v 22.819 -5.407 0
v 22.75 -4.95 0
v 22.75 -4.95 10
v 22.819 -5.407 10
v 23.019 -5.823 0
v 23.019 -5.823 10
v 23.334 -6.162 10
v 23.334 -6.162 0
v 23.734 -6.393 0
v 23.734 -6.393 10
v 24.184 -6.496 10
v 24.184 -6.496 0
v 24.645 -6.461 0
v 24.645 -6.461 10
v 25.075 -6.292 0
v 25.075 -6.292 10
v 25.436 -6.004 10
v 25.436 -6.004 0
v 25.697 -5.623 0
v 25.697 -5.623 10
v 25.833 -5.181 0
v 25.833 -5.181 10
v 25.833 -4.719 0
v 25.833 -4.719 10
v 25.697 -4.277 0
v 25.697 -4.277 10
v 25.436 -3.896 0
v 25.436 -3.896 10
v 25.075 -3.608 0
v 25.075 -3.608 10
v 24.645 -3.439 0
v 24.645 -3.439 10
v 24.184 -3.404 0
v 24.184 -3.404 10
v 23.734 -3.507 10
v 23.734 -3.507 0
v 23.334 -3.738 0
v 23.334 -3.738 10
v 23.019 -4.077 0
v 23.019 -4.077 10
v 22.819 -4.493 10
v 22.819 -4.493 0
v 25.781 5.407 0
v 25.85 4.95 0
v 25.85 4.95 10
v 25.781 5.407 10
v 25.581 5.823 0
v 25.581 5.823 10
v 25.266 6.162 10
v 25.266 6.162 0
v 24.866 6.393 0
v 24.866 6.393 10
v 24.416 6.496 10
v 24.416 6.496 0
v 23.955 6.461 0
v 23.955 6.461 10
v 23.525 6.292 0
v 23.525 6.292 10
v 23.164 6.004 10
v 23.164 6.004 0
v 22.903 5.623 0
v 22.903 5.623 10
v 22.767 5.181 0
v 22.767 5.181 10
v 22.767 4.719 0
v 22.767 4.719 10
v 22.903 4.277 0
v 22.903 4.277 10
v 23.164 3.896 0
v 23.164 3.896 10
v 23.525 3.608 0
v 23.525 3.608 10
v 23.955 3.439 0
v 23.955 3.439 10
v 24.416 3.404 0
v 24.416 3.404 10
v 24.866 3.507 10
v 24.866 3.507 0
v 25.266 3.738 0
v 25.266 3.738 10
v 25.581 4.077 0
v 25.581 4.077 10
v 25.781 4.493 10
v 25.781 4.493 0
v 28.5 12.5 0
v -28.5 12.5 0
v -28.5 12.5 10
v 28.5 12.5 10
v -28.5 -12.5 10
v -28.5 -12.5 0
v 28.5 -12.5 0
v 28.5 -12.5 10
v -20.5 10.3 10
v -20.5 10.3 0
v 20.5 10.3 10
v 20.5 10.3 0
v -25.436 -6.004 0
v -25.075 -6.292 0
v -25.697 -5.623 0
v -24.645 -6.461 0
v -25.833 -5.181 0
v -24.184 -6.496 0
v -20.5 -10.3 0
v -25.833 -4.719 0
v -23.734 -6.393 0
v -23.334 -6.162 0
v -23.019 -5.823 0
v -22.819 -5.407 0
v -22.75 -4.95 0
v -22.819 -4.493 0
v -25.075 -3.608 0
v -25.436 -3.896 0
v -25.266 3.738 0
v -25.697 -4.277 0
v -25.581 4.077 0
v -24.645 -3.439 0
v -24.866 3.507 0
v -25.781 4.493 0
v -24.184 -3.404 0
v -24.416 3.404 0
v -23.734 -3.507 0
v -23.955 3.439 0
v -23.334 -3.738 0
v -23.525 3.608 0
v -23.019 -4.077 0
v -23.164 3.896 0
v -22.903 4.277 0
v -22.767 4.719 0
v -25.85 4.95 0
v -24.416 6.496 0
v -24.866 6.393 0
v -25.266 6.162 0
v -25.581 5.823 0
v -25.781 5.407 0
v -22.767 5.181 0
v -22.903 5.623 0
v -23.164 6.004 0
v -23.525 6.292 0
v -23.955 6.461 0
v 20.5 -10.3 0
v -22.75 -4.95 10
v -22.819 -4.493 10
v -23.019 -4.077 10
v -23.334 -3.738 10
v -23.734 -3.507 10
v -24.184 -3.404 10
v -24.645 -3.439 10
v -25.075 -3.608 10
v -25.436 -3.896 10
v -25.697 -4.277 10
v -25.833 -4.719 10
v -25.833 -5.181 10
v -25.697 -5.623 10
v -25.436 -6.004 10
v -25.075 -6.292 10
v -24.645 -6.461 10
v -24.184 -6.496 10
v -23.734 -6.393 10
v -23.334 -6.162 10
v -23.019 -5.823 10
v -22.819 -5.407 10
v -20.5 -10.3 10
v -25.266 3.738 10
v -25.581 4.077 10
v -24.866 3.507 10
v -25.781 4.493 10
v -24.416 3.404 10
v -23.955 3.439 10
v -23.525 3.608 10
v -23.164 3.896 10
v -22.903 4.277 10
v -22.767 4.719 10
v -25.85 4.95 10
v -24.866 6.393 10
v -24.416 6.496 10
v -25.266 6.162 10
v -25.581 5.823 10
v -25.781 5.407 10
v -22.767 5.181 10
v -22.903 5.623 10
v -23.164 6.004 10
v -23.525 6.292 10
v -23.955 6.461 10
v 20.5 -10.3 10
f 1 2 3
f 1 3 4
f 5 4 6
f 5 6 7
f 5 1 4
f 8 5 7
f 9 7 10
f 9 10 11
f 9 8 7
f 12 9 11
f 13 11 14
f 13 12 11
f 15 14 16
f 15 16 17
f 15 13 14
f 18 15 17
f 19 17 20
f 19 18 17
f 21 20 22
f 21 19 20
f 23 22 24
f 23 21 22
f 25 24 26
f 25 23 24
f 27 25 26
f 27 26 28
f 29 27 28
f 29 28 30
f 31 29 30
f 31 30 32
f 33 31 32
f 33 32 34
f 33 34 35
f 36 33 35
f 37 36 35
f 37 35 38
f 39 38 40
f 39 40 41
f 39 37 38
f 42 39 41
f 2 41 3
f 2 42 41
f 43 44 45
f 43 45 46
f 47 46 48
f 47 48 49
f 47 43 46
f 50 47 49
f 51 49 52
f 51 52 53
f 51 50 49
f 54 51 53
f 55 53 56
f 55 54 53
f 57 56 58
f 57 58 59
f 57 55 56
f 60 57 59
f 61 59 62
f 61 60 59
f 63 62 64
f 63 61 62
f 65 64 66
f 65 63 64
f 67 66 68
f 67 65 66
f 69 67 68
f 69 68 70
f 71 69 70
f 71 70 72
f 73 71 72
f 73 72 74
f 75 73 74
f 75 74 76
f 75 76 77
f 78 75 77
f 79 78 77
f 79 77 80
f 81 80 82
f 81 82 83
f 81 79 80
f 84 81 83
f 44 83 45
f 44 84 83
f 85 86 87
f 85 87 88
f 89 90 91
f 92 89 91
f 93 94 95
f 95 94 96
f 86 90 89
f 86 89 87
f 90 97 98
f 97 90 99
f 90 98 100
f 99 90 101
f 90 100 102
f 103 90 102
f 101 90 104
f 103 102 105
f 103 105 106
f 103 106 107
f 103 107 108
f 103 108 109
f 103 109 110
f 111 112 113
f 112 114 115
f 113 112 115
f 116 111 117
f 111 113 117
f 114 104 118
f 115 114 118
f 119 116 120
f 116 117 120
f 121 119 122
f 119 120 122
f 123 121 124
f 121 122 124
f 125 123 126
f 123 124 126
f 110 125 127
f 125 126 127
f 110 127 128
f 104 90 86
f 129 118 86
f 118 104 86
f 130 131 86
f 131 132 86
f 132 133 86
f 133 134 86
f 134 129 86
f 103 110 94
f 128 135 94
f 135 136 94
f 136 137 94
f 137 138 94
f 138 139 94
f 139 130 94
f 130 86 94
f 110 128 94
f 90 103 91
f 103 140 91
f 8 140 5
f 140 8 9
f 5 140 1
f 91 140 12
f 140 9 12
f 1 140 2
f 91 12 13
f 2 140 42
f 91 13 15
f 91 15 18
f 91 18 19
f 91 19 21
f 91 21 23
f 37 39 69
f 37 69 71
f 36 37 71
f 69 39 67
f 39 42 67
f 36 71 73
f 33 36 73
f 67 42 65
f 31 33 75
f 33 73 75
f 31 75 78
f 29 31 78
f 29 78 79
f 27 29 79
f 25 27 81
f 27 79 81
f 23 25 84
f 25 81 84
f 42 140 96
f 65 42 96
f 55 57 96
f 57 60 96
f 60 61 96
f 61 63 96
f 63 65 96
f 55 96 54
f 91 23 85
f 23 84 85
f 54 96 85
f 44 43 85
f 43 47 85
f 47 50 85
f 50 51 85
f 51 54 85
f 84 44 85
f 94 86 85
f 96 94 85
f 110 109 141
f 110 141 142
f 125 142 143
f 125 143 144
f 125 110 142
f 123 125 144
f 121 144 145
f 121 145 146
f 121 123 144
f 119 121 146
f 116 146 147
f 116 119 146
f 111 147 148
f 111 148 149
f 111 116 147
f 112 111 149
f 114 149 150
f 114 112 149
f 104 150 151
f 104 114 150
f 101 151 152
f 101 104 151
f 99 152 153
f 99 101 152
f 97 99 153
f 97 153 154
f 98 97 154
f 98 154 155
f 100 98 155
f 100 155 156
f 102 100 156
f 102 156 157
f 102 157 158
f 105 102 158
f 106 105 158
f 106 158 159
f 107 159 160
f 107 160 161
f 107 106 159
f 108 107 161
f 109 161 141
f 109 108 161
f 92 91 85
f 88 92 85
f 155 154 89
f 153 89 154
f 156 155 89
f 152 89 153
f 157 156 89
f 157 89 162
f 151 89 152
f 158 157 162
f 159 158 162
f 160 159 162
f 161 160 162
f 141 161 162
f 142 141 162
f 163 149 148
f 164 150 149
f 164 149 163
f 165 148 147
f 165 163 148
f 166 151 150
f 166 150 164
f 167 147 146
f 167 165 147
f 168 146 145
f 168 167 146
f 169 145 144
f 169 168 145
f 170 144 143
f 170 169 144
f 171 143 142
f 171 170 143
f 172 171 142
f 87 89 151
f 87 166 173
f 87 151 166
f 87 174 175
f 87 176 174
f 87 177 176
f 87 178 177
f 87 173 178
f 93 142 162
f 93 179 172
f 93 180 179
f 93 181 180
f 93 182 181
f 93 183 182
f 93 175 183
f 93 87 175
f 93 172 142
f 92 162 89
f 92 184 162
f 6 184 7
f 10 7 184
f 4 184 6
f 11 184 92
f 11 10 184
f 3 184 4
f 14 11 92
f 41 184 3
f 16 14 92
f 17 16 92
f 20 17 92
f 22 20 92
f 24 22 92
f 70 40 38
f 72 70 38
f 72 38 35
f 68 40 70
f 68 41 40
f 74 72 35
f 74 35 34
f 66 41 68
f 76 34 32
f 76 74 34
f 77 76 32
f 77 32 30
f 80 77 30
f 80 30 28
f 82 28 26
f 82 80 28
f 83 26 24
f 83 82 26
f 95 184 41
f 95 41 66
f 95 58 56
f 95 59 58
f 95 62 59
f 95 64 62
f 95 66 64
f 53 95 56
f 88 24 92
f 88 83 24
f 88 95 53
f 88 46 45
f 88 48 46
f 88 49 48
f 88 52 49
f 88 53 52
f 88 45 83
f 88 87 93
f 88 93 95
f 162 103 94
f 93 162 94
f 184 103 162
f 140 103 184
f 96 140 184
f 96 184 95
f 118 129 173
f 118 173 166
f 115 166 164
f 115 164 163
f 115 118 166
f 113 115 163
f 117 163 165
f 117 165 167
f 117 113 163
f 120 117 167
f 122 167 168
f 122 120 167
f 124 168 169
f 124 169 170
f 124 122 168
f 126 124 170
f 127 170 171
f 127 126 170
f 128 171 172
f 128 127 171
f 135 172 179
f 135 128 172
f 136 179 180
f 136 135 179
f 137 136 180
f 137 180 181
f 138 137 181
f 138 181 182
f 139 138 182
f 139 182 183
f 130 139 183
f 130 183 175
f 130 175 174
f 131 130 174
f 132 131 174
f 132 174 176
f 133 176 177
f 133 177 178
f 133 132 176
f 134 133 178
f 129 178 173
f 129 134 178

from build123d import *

# Parameters (mm, degrees)
SKETCH_1_W      = 57
SKETCH_1_H      = 25
SKETCH_1_R      = 1.55
SKETCH_1_W_2    = 41
SKETCH_1_H_2    = 20.6
EXTRUDE_1_DEPTH = 10


with BuildPart() as part:
    # 草图1 → 凸台-拉伸1 (new body)
    with BuildSketch(Plane.XY):
        Rectangle(SKETCH_1_W, SKETCH_1_H)
        with Locations((24.3, 4.95)):
            Circle(SKETCH_1_R, mode=Mode.SUBTRACT)
        with Locations(Location((-24.3, 4.95, 0), (0, 0, 180))):
            Circle(SKETCH_1_R, mode=Mode.SUBTRACT)
        with Locations((-24.3, -4.95)):
            Circle(SKETCH_1_R, mode=Mode.SUBTRACT)
        with Locations(Location((24.3, -4.95, 0), (0, 0, 180))):
            Circle(SKETCH_1_R, mode=Mode.SUBTRACT)
        Rectangle(SKETCH_1_W_2, SKETCH_1_H_2, mode=Mode.SUBTRACT)
    extrude(amount=EXTRUDE_1_DEPTH)


solid = part.part
